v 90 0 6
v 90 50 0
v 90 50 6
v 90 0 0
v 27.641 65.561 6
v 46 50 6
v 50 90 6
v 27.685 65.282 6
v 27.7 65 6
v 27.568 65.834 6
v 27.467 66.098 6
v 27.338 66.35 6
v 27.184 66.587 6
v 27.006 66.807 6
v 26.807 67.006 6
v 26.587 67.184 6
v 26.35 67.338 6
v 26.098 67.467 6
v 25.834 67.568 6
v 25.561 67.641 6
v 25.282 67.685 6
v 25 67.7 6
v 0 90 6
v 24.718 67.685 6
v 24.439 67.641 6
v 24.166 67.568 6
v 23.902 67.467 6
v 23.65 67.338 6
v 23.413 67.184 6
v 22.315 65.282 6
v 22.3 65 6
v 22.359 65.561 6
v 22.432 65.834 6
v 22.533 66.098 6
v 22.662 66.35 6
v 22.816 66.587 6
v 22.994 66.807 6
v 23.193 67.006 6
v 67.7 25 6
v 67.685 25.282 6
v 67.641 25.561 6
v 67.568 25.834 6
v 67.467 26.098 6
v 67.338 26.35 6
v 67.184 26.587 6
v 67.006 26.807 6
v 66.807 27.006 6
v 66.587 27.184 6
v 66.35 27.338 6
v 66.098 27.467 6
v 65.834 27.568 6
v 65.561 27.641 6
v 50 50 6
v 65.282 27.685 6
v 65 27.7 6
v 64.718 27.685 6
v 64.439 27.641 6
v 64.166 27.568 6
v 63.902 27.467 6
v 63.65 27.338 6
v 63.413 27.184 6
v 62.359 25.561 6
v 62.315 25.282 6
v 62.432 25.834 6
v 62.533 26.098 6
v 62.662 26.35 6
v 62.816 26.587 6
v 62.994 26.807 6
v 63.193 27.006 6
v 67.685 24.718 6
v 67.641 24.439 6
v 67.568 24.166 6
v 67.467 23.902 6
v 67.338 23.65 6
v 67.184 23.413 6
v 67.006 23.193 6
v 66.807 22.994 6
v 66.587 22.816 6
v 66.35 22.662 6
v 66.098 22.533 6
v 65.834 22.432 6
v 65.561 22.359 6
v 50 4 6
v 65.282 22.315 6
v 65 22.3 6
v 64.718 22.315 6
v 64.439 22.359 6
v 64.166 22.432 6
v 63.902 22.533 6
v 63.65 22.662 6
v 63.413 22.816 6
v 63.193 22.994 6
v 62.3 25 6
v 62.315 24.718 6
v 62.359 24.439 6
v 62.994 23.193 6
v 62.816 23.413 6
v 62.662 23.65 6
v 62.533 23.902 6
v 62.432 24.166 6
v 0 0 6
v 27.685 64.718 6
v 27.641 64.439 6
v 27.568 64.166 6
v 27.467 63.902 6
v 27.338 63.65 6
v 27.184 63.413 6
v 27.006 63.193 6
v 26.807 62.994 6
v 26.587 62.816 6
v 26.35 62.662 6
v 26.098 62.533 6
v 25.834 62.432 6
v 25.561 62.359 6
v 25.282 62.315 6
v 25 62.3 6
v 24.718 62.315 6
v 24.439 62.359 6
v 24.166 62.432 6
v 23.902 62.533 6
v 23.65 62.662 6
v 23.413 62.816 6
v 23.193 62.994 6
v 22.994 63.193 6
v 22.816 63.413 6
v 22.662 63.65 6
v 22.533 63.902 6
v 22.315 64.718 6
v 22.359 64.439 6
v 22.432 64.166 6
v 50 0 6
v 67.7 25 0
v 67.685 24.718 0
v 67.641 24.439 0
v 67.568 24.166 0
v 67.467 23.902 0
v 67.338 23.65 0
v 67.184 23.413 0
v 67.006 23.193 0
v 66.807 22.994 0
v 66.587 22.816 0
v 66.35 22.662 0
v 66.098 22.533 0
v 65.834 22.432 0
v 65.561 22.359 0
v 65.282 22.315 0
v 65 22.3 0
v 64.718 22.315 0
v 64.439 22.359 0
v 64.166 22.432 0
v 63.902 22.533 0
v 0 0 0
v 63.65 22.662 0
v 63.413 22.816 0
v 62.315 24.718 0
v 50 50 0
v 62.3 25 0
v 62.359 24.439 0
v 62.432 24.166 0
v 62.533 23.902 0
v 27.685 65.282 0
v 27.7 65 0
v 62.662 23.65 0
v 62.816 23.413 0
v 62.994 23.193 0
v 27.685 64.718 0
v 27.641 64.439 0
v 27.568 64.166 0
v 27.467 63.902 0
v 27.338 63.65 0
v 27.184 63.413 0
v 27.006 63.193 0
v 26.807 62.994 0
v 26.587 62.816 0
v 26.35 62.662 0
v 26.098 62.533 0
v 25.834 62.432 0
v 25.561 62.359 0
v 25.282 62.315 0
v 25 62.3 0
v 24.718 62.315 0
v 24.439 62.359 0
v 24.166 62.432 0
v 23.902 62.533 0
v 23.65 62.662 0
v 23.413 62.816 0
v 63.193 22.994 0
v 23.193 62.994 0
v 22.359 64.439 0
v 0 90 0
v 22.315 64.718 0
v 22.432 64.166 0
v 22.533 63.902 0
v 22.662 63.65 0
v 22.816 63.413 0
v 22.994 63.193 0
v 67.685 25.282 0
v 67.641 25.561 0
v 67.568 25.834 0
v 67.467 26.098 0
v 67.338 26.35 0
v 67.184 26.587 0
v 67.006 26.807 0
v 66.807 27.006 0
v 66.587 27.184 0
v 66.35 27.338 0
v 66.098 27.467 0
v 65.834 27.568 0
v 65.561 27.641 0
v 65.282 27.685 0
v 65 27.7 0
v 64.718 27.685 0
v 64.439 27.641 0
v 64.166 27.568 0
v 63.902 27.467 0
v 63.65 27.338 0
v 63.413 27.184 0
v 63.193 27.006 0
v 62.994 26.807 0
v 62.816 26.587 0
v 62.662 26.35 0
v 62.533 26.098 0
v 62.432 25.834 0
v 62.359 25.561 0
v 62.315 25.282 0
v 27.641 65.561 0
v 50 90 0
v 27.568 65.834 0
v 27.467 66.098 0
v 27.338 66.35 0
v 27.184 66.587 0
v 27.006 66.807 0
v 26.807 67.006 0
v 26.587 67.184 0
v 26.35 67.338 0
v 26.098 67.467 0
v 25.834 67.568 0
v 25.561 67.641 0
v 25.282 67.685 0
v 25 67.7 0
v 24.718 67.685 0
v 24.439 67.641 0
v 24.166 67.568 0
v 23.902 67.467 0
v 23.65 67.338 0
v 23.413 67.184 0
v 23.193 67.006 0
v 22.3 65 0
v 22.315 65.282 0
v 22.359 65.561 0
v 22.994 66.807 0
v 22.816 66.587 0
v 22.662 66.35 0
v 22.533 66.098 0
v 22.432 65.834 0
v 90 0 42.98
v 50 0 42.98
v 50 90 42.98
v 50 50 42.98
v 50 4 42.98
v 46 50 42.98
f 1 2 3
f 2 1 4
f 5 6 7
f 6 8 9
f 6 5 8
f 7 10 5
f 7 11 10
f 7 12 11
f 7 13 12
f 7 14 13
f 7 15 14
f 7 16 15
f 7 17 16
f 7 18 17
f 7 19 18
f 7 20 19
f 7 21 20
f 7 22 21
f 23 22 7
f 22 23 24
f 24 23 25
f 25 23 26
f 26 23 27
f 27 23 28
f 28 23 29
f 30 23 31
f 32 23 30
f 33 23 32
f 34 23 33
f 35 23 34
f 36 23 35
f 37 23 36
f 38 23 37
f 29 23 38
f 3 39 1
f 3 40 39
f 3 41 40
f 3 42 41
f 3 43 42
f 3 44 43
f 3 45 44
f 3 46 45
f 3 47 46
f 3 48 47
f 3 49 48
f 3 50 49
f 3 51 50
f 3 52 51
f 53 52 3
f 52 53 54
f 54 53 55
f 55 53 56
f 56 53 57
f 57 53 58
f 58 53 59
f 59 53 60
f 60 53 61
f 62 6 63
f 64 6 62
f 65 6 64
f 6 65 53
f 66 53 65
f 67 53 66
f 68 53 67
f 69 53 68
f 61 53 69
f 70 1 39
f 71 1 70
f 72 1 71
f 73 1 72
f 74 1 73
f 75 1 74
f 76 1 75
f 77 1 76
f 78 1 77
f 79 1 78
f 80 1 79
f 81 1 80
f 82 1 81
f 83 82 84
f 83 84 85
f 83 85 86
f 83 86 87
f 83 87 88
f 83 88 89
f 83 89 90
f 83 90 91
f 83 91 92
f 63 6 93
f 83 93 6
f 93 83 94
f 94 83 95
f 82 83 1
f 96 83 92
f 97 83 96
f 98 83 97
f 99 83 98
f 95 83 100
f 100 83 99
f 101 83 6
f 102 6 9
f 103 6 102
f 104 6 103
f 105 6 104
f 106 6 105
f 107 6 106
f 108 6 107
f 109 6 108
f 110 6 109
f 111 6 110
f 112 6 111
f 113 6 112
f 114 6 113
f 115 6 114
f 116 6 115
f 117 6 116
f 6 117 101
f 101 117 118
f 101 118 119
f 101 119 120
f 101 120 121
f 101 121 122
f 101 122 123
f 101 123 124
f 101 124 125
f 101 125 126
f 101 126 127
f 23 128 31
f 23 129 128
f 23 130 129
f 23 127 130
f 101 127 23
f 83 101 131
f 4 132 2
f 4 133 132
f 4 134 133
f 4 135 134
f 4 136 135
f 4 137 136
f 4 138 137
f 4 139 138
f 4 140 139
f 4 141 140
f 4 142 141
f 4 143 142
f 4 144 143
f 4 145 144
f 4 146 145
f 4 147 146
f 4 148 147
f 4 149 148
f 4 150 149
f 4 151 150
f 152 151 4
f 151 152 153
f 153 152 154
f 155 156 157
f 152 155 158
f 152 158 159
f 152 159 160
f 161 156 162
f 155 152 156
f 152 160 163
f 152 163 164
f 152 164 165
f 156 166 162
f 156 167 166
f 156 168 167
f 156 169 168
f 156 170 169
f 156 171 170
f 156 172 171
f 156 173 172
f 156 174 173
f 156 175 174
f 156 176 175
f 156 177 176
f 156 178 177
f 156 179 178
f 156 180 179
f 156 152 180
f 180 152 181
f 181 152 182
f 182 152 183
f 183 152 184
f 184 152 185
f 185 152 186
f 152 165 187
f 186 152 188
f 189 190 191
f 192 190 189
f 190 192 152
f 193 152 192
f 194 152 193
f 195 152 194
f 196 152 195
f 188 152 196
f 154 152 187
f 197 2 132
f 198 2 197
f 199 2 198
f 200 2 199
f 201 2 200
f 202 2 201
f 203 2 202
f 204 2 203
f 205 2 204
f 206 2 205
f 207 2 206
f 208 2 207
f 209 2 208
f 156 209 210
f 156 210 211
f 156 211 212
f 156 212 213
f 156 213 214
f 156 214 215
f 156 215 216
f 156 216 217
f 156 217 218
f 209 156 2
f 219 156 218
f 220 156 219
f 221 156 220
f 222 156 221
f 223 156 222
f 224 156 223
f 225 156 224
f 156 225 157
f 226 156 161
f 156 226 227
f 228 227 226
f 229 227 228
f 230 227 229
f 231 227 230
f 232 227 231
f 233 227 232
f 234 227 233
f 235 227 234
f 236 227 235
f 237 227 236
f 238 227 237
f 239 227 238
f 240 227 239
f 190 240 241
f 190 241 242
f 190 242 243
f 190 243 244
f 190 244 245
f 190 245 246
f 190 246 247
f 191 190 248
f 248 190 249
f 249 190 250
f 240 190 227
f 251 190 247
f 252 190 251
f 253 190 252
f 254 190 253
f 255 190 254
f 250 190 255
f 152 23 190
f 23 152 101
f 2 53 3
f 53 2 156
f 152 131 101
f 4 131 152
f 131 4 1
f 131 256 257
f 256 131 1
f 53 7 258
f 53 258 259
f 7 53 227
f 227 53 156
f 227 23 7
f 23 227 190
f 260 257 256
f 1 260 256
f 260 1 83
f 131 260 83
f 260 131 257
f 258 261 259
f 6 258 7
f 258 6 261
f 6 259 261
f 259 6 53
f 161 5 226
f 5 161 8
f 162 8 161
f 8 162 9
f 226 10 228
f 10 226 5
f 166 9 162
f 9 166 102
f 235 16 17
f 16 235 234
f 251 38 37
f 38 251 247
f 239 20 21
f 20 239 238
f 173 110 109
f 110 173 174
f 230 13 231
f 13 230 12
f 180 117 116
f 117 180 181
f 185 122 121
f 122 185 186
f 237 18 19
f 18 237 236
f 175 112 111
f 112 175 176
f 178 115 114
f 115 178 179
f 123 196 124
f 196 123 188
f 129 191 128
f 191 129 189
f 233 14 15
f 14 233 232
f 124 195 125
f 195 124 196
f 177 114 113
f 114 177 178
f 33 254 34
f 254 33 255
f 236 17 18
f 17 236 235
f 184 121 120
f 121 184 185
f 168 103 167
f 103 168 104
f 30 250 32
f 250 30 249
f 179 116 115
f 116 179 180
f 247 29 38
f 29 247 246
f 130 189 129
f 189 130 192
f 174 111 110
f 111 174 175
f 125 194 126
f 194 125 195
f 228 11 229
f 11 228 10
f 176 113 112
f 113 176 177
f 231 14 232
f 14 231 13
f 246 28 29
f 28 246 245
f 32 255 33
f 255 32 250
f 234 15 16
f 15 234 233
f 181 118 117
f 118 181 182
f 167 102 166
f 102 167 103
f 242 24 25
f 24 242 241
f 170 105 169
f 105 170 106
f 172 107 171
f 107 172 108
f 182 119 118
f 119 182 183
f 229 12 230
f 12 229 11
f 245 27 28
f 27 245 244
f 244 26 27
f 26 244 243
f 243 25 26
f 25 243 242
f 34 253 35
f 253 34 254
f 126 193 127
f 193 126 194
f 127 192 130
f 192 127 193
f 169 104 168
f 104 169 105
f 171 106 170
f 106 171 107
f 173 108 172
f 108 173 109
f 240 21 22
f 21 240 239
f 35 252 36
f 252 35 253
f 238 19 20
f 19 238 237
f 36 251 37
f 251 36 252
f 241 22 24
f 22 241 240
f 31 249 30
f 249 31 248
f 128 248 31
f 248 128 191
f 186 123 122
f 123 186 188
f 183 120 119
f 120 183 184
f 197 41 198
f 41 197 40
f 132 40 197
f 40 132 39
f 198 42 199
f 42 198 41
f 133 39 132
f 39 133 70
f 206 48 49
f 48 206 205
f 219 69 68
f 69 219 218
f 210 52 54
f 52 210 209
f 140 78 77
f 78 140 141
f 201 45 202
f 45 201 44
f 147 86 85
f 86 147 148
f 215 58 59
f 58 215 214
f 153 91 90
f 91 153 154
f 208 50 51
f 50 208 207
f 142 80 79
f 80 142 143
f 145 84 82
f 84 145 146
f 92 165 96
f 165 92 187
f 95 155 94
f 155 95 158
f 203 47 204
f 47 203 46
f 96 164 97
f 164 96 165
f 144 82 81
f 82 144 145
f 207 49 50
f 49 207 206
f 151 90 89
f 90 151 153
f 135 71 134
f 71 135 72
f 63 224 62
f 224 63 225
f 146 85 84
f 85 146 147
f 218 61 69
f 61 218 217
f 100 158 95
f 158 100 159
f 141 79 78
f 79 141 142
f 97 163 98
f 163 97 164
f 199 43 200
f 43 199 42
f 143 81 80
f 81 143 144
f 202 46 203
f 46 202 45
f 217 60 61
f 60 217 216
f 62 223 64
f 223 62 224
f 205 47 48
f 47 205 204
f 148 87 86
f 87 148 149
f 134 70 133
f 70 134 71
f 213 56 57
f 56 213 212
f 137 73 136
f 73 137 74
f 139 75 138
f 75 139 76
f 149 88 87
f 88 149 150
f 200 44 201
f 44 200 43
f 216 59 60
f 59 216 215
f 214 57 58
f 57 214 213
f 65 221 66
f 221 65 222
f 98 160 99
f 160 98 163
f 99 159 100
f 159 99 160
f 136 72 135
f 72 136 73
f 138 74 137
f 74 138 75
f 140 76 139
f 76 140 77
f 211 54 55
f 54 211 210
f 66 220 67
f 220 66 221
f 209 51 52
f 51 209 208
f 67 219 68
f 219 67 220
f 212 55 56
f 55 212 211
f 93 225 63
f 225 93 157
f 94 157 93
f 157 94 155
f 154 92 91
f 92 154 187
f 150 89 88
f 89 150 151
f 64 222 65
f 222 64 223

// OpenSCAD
// Reinforced right-angle gusset for 50 mm profile.
$fn = 60;
eps = 0.02;
profile = 50;
arm = 90;
plate_t = 6;
rib_t = 4;
rib_h = 37;
module rib_x() {
    translate([profile, 0, plate_t - eps]) linear_extrude(height = rib_h)
        polygon(points = [[0, 0], [arm - profile, 0], [0, rib_t]]);
}
module rib_y() {
    translate([profile, profile, plate_t - eps]) rotate([0, 0, 90]) linear_extrude(height = rib_h)
        polygon(points = [[0, 0], [arm - profile, 0], [0, rib_t]]);
}
difference() {
    union() { cube([arm, profile, plate_t]); cube([profile, arm, plate_t]); rib_x(); rib_y(); }
    for (p = [[profile / 2, arm - profile / 2], [arm - profile / 2, profile / 2]])
        translate([p[0], p[1], -eps]) cylinder(d = 5.4, h = plate_t + 2 * eps);
}
